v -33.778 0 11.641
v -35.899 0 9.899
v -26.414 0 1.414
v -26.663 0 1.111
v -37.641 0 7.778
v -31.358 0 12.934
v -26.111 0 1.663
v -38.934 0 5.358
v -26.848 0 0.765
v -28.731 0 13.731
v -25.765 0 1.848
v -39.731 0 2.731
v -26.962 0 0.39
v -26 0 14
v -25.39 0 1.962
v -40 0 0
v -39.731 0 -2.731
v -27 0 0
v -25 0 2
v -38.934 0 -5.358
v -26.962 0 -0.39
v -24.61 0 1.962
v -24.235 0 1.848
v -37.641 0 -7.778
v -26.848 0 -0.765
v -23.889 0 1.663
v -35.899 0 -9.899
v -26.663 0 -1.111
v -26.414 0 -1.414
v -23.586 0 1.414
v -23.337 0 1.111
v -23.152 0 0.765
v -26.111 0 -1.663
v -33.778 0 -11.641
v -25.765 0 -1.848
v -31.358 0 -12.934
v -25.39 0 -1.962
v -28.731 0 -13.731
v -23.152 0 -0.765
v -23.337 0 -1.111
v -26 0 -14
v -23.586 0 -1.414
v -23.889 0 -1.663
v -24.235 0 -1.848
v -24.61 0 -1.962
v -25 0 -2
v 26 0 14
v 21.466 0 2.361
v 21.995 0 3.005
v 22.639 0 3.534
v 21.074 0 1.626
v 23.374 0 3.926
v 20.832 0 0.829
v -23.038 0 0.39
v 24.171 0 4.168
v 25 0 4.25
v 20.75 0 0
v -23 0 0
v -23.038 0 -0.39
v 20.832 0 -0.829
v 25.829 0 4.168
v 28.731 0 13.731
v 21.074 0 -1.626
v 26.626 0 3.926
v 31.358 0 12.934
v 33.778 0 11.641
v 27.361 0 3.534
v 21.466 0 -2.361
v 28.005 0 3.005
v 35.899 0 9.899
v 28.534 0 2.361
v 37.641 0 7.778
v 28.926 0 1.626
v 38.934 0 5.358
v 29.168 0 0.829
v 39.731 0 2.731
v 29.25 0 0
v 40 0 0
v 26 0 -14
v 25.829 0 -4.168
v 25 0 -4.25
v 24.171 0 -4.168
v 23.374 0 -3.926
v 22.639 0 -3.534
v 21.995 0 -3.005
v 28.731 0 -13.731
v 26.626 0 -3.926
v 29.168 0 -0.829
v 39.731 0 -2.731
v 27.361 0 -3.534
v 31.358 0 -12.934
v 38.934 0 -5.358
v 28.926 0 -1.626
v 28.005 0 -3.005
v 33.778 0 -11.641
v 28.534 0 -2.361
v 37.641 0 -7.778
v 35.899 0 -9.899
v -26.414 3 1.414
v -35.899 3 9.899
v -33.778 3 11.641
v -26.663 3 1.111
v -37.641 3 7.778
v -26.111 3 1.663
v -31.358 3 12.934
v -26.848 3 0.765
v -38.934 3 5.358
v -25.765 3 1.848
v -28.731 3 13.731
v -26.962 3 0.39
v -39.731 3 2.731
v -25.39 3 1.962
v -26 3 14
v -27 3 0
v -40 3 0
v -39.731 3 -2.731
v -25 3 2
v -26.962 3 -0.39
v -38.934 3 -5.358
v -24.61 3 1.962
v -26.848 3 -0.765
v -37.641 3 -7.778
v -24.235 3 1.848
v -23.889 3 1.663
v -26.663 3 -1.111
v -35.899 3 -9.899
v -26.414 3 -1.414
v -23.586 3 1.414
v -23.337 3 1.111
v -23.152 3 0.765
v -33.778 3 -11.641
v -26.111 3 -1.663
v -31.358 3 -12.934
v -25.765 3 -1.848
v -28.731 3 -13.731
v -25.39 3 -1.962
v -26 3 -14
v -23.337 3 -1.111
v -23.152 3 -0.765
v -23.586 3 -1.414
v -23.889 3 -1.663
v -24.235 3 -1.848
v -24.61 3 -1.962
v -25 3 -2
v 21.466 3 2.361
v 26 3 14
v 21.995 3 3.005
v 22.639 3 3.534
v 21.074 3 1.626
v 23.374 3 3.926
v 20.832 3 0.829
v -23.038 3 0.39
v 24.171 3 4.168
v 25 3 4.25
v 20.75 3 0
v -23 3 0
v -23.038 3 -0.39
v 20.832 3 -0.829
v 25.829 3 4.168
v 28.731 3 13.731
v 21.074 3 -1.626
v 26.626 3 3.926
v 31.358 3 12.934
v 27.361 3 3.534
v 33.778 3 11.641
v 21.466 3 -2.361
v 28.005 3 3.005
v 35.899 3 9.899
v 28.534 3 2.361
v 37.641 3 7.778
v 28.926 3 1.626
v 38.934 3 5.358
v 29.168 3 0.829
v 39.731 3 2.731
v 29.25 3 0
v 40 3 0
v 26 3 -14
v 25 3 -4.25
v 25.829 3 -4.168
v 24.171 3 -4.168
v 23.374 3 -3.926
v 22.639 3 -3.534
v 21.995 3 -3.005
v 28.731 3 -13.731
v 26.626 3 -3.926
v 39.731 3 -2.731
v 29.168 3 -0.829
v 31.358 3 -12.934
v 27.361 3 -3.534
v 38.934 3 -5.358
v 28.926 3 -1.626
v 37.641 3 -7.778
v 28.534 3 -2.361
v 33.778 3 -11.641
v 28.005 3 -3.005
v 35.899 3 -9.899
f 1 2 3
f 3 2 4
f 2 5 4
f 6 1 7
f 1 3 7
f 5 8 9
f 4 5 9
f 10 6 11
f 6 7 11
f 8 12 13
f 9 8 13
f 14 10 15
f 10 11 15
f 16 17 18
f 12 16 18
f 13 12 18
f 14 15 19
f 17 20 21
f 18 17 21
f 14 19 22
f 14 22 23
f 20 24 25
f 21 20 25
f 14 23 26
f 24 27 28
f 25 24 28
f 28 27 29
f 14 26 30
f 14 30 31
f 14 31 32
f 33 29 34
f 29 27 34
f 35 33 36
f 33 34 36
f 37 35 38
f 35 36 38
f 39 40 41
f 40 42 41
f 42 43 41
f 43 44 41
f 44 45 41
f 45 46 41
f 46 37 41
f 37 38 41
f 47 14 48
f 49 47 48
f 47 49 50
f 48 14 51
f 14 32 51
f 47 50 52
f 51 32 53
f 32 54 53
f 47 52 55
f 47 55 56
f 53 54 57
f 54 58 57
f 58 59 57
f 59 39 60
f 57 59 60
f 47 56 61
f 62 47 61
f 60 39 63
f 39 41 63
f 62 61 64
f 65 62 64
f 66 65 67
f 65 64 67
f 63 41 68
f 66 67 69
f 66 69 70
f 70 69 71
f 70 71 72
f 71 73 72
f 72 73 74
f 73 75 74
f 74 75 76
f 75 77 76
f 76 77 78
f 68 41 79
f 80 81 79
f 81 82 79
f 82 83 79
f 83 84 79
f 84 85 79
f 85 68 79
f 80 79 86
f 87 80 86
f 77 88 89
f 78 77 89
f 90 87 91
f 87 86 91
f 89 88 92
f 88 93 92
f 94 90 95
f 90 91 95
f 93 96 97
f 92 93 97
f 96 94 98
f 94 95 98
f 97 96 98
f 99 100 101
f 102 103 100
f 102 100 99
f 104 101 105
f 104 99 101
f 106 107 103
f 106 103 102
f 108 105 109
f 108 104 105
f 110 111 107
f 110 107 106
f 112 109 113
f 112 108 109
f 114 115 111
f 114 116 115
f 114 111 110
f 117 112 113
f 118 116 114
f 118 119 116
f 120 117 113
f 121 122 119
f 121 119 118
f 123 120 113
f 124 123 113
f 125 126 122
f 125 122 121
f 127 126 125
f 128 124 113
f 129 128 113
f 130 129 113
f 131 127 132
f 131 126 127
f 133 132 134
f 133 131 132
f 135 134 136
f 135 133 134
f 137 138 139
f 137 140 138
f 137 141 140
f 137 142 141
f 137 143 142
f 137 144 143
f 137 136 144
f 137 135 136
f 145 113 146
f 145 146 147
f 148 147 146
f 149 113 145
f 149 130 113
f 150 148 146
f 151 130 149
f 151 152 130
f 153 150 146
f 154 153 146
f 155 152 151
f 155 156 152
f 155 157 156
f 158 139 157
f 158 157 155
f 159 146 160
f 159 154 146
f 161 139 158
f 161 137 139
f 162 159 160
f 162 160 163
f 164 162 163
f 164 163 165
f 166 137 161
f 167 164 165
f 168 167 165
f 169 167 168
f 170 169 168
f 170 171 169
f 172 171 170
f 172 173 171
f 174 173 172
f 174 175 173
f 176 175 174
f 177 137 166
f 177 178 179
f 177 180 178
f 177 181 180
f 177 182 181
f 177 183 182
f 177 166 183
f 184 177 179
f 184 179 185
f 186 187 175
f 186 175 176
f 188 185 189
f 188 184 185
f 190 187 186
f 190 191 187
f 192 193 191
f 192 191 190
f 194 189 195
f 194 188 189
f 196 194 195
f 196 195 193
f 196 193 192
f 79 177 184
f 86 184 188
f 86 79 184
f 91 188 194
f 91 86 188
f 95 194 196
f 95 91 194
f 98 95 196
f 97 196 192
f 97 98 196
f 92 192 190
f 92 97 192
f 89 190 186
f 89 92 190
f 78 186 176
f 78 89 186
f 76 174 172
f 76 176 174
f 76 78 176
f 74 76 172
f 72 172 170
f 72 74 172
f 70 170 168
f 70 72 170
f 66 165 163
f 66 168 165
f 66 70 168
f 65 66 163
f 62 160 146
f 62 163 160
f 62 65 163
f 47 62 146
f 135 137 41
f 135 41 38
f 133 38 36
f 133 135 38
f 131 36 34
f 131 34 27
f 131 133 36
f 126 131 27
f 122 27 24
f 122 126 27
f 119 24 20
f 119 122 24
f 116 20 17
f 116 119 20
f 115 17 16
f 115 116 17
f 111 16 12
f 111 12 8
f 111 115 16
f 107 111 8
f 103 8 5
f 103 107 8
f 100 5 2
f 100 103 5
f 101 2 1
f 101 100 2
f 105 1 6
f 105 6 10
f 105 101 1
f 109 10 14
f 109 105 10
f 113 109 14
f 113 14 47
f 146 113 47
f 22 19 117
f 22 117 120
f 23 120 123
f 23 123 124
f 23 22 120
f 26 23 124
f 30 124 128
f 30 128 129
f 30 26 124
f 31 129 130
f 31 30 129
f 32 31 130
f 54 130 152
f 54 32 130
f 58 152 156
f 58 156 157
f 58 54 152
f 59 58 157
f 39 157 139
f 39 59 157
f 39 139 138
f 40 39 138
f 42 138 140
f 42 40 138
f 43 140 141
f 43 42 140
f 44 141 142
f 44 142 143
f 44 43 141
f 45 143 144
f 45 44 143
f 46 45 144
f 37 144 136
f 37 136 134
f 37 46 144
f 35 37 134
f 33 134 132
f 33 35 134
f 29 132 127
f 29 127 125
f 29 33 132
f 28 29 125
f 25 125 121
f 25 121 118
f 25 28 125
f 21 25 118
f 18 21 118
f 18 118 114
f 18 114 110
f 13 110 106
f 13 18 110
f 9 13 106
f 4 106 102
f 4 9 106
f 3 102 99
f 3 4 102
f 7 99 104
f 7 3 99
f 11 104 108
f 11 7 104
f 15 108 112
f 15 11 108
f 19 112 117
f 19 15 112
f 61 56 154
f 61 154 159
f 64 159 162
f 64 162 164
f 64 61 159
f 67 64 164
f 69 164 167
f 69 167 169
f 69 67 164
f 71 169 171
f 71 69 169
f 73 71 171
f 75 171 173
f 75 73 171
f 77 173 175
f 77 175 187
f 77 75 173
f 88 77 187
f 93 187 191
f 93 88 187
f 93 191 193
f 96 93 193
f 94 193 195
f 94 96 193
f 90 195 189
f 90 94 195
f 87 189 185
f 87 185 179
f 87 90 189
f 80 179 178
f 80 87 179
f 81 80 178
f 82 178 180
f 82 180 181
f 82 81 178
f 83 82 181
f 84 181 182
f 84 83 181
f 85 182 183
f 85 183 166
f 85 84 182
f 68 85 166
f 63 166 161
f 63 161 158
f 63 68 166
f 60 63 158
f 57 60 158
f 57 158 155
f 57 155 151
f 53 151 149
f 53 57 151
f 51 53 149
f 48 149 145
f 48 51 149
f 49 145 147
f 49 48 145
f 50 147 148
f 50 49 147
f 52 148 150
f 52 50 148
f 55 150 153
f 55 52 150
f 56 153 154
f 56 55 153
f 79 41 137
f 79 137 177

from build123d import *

# Parameters (mm, degrees)
SKETCH_1_W      = 80
SKETCH_1_H      = 28
SKETCH_1_R      = 4.25
SKETCH_1_R_2    = 2
EXTRUDE_1_DEPTH = 3
FILLET_1_RADIUS = 14
FILLET_1_LENGTH = 3
FILLET_2_RADIUS = 14
FILLET_2_LENGTH = 3


with BuildPart() as part:
    # 草图1 → 凸台-拉伸1 (new body)
    with BuildSketch(Plane(origin=(0, 0, 0), x_dir=(1, 0, 0), z_dir=(0, 1, 0))):
        Rectangle(SKETCH_1_W, SKETCH_1_H)
        with Locations(Location((25, 0, 0), (0, 0, 270))):
            Circle(SKETCH_1_R, mode=Mode.SUBTRACT)
        with Locations(Location((-25, 0, 0), (0, 0, 270))):
            Circle(SKETCH_1_R_2, mode=Mode.SUBTRACT)
    extrude(amount=EXTRUDE_1_DEPTH)

    # 圆角1: full round fillet: the end face becomes a half cylinder, R = half its width
    fillet_1_face = Plane((-40, 1.5, 0), x_dir=(0, 1, 0), z_dir=(-1, 0, 0))  # on the end face: x along it, z out of the body
    fillet_1_slab = fillet_1_face.offset(-FILLET_1_RADIUS / 2) * Box(FILLET_1_LENGTH, 2 * FILLET_1_RADIUS, FILLET_1_RADIUS, mode=Mode.PRIVATE)  # the body's end, R deep
    fillet_1_round = Plane((-26, 1.5, 0), x_dir=(-1, 0, 0), z_dir=(0, 1, 0)) * Cylinder(FILLET_1_RADIUS, FILLET_1_LENGTH, mode=Mode.PRIVATE)  # its axis R under the face
    add(fillet_1_slab - fillet_1_round, mode=Mode.SUBTRACT)

    # 圆角2: full round fillet: the end face becomes a half cylinder, R = half its width
    fillet_2_face = Plane((40, 1.5, 0), x_dir=(0, -1, 0), z_dir=(1, 0, 0))  # on the end face: x along it, z out of the body
    fillet_2_slab = fillet_2_face.offset(-FILLET_2_RADIUS / 2) * Box(FILLET_2_LENGTH, 2 * FILLET_2_RADIUS, FILLET_2_RADIUS, mode=Mode.PRIVATE)  # the body's end, R deep
    fillet_2_round = Plane((26, 1.5, 0), x_dir=(1, 0, 0), z_dir=(0, -1, 0)) * Cylinder(FILLET_2_RADIUS, FILLET_2_LENGTH, mode=Mode.PRIVATE)  # its axis R under the face
    add(fillet_2_slab - fillet_2_round, mode=Mode.SUBTRACT)


solid = part.part
